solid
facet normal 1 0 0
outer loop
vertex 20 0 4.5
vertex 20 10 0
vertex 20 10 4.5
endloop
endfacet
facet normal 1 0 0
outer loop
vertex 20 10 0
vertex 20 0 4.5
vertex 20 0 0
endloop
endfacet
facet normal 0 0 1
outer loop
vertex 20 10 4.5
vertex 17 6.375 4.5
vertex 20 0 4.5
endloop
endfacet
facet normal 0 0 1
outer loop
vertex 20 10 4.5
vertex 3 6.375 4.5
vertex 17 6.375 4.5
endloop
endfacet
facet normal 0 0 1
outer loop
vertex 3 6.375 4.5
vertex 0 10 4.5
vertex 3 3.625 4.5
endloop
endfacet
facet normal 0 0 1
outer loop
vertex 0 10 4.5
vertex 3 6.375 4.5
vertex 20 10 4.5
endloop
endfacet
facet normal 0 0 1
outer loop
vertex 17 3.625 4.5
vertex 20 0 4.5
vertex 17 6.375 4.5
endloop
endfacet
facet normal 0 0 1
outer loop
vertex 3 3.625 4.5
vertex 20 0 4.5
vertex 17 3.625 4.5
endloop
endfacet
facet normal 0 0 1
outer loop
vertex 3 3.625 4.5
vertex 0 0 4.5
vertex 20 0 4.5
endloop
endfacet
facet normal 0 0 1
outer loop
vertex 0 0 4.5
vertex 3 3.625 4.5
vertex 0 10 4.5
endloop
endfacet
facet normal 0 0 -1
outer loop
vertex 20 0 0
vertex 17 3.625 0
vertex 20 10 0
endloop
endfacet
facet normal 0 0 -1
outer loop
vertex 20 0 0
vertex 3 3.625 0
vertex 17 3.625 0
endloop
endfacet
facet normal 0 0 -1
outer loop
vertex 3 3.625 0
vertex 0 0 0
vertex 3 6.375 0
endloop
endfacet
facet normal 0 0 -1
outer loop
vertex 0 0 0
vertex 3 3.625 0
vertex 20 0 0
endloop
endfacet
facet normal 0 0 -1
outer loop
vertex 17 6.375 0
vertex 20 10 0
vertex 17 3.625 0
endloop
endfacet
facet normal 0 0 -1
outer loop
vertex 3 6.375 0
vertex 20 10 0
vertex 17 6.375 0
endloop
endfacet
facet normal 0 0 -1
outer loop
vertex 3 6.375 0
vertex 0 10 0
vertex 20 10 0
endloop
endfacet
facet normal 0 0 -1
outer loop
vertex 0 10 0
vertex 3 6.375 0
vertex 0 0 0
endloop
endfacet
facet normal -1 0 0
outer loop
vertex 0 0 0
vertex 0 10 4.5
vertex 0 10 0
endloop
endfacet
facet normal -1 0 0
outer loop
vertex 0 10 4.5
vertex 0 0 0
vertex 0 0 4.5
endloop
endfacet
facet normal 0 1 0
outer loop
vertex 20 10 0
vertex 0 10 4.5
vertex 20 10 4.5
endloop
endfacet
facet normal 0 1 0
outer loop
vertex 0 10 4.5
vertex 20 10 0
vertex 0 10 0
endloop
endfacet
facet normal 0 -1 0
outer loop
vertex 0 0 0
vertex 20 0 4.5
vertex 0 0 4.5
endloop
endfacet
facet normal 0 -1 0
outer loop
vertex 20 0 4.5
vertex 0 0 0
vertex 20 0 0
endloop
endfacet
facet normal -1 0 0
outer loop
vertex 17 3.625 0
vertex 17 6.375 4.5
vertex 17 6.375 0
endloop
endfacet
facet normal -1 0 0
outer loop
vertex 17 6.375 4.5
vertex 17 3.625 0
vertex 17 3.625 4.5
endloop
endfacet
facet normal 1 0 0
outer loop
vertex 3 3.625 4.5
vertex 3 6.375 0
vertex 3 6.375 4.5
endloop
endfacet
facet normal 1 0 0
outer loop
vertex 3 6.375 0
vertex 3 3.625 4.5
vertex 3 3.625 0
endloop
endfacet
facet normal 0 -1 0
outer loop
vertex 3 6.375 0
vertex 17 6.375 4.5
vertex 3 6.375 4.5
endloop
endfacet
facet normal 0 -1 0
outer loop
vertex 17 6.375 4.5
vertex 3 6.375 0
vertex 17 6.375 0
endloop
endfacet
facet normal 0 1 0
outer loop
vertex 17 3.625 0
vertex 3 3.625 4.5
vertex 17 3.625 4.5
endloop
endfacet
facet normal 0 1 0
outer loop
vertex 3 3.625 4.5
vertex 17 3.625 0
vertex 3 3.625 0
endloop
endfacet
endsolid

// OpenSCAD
difference() {
    dip_x=20;
    dip_y=10;
    dip_z=4.5;
    color("black") cube([dip_x,dip_y,dip_z]);
    hole_x=14;
    hole_y=2.75;
    translate([(dip_x-hole_x)/2,(dip_y-hole_y)/2,-1])
        cube([14,2.75,dip_z*2]);
}
